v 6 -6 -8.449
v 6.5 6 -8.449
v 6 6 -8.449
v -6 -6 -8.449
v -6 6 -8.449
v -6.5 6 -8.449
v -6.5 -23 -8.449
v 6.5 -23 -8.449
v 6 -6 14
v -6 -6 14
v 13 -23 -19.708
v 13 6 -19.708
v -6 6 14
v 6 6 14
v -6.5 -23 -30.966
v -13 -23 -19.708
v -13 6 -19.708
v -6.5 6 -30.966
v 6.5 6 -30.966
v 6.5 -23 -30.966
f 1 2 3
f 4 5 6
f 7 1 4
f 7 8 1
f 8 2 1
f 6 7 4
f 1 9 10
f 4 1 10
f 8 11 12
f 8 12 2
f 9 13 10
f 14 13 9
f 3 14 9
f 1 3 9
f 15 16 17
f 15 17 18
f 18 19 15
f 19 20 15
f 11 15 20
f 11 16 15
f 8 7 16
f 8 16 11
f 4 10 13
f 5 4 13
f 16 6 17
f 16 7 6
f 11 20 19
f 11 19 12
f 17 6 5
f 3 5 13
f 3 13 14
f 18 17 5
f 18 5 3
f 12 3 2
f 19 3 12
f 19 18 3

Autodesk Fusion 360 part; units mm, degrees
sketch "Sketch2" plane through (0, 0, 0) normal (0, 0, 1) x (1, 0, 0)
  line L0 (-6, 6) -> (6, 6)
  line L1 (6, 6) -> (6, -6)
  line L2 (6, -6) -> (-6, -6)
  line L3 (-6, -6) -> (-6, 6)
  line L4 (-6, 6) -> (6, -6) construction
  line L5 (6, 6) -> (-6, -6) construction
  dimension "d1" = 12
  dimension "d2" = 12
extrude "Extrude1" add sketch "Sketch2" along normal blind 14 makes body 1
sketch "Sketch3" plane through (0, -6, 0) normal (0, -1, 0) x (1, 0, 0)
  line L0 (-6, 0) -> (6, 0)
  line L1 (6, 0) -> (6, 14)
  line L2 (6, 14) -> (-6, 14)
  line L3 (-6, 14) -> (-6, 0)
  line L4 (-6, 0) -> (6, 0)
  line L5 (6, 0) -> (6, -30.9661)
  line L6 (6, -30.9661) -> (-6, -30.9661)
  line L7 (-6, -30.9661) -> (-6, 0)
  line L8 (0, 0) -> (0, -30.9661) construction
  line L9 (13, -19.7077) -> (6.5, -8.4494)
  line L10 (6.5, -8.4494) -> (-6.5, -8.4494)
  line L11 (-6.5, -8.4494) -> (-13, -19.7077)
  line L12 (-13, -19.7077) -> (-6.5, -30.9661)
  line L13 (-6.5, -30.9661) -> (6.5, -30.9661)
  line L14 (6.5, -30.9661) -> (13, -19.7077)
  point P0 (0, -19.7077)
  dimension "d5" = 13
extrude "Extrude2" add sketch "Sketch3" along normal blind 17 separate body contours L5 L6 L7 L10 L13 | L7 L10 L11 L12 L13 | L5 L9 L10 L13 L14 makes body 2
extrude "Extrude3" add 1 faces at (2.1667, -6, -15.955) along direction (0, 1, 0) blind 12 on bodies 2 bodies 2
extrude "Extrude4" add 1 faces at (2, -2, 0) along direction (0, 0, -1) blind 10.3851 on bodies 1 bodies 1 2
